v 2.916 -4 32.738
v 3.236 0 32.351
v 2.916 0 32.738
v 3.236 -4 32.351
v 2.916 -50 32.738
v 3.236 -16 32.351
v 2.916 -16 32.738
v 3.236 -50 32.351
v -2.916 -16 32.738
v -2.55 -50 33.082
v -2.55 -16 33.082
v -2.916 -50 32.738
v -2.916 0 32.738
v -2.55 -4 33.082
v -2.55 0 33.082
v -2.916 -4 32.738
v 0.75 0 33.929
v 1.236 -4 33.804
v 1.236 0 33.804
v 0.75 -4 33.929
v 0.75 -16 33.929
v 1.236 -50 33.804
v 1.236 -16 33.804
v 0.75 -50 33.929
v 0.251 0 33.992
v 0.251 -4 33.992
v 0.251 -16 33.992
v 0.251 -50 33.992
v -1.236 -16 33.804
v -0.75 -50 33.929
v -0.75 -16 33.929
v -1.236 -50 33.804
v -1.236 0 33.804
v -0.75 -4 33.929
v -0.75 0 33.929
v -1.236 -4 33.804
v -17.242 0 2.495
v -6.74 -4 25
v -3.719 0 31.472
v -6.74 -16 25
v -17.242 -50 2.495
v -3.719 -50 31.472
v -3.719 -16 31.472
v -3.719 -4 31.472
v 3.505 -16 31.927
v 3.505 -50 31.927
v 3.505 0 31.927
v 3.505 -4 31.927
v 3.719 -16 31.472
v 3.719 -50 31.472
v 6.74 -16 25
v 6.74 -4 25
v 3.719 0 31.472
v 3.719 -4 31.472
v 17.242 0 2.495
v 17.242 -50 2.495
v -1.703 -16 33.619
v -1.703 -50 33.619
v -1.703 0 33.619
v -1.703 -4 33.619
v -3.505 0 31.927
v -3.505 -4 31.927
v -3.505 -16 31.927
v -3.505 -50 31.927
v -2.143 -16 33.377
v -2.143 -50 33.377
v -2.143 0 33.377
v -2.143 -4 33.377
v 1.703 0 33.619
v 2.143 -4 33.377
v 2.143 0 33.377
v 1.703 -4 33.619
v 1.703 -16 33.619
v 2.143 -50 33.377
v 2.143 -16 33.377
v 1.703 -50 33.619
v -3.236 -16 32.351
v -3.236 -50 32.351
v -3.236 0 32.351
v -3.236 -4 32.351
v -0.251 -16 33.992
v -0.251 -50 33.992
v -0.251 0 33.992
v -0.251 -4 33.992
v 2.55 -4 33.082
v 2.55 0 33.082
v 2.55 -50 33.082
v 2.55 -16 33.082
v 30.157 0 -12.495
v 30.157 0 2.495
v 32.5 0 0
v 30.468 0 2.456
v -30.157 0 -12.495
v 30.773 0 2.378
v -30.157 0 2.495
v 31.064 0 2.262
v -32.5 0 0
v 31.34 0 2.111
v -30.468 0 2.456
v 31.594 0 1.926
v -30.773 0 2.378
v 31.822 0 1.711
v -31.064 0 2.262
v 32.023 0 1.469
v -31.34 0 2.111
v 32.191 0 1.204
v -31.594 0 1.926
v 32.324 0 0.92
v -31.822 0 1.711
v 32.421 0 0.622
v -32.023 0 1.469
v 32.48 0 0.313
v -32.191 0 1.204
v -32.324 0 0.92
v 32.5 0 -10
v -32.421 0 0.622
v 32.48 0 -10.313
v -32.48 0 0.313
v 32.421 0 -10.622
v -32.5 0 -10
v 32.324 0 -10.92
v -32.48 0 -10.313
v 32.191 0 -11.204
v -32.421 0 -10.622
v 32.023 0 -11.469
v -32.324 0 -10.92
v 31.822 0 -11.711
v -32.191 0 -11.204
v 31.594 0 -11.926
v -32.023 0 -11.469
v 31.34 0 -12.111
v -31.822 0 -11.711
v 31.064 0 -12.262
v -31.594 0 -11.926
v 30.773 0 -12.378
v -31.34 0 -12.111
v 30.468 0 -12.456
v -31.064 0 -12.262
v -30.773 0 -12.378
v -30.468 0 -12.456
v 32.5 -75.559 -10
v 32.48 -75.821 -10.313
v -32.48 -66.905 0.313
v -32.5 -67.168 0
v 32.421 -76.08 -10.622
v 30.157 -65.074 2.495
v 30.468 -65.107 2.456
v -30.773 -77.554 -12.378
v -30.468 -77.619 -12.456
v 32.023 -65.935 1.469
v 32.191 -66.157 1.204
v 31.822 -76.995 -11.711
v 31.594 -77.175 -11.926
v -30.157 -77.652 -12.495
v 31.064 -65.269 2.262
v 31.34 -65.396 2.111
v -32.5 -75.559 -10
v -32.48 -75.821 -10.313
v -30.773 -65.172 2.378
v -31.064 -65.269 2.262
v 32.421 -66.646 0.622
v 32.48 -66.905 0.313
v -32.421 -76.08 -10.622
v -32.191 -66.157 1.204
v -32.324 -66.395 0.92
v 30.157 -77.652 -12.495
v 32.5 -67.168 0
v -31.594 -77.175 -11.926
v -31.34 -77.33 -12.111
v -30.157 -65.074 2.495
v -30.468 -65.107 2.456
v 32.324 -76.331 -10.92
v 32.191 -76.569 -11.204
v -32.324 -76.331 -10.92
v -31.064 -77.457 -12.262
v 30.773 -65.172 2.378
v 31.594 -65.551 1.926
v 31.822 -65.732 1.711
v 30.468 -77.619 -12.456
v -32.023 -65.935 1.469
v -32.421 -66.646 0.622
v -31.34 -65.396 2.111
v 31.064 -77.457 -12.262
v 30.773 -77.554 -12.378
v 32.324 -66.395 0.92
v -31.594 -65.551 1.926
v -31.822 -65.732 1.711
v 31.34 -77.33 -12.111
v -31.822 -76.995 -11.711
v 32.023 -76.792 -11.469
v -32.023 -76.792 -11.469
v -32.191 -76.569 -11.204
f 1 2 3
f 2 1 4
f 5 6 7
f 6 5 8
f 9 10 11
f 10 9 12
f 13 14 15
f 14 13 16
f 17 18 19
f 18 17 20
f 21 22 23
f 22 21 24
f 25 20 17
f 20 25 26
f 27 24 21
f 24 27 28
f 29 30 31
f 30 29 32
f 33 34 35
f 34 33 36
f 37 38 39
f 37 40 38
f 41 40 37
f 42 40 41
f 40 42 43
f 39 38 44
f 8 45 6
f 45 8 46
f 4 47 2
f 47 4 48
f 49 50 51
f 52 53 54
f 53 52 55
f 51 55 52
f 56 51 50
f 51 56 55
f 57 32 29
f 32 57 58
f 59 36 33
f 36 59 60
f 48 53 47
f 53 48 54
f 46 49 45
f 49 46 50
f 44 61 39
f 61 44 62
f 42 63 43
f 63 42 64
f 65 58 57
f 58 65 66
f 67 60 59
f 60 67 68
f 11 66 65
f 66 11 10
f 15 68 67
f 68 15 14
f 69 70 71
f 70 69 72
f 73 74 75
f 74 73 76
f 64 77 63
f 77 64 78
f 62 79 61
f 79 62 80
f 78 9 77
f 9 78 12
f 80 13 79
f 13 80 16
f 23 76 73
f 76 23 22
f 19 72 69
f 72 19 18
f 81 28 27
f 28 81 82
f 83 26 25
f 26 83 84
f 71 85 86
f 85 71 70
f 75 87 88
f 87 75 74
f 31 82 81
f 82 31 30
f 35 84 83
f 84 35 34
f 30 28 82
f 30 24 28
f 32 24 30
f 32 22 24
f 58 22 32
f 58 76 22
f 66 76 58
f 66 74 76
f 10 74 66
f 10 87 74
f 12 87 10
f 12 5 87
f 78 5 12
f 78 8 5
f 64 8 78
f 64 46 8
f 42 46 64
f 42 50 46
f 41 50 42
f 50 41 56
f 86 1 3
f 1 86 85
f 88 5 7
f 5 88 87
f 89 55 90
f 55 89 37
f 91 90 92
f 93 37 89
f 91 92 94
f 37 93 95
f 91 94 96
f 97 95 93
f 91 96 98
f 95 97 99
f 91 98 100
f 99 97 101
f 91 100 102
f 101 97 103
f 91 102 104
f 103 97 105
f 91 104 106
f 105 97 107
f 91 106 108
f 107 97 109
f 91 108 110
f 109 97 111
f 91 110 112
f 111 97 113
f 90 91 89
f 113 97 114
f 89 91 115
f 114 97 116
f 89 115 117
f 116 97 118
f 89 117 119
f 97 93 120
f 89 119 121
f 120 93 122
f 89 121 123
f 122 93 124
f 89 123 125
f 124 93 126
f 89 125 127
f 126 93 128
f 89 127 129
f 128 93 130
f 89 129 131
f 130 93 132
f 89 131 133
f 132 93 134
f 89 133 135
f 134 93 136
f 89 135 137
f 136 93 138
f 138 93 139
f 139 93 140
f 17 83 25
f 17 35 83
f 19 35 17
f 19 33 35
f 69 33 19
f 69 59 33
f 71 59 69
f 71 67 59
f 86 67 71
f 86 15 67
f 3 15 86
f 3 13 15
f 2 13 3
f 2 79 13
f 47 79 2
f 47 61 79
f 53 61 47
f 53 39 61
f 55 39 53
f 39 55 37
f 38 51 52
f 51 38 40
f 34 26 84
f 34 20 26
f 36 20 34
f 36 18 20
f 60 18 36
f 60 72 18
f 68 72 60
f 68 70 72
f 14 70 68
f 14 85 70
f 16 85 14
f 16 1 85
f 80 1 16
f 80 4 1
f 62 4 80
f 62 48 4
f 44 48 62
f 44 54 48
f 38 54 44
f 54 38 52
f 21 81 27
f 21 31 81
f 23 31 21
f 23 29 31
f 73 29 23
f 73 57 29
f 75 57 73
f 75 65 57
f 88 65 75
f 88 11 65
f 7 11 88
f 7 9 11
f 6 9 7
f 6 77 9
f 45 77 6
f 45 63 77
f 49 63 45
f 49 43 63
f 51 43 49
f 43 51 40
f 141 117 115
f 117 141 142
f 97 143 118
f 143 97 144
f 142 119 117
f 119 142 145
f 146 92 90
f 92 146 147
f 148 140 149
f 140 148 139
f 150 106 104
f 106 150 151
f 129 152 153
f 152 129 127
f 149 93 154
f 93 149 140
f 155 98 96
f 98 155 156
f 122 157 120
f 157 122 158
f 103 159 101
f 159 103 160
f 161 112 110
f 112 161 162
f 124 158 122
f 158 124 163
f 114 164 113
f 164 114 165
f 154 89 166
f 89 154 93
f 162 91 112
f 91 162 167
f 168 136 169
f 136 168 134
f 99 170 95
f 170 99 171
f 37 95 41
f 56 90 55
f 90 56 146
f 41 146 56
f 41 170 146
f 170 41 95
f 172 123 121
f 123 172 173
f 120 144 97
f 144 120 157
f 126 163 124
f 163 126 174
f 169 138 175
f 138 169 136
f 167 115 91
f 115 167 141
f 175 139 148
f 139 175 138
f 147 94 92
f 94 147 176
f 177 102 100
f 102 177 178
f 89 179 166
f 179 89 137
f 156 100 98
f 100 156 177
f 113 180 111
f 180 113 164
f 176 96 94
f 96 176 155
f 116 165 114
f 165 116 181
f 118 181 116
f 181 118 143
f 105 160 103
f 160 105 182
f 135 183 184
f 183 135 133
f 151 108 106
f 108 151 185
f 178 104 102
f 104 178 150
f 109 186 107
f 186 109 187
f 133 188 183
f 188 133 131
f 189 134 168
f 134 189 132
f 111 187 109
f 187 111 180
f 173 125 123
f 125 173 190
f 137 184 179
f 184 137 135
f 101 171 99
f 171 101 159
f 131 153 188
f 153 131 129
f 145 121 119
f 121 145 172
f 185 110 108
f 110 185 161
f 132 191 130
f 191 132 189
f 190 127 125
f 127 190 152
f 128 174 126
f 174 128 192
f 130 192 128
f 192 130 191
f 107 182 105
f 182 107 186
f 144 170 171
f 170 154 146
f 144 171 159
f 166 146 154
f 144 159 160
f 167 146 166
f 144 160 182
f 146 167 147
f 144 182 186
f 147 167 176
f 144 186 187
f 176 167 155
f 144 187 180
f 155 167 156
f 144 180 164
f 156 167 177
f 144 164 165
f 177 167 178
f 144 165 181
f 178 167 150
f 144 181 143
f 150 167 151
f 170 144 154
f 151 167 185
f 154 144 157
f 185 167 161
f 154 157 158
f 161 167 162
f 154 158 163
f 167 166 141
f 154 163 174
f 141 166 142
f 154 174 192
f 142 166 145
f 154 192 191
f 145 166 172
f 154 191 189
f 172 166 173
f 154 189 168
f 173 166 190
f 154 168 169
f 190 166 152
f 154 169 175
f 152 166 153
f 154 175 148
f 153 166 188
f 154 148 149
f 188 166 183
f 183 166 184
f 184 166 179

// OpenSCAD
/*
 * birthday_glasses_holder.scad
 * An eye glasses holder design for Parul on her
 * birthday: May 29th, 2017
 */
corner_dia = 8;
glasses_base_width = 28;
glasses_base_height = 30;
glasses_base_length = 50;
cutout_length = 12;
base_width = 60;
base_length = 80;

$fn=50;
module triangularBase(width, height, length, corner_diameter) {
    linear_extrude(height=length)
    hull() {
        translate([-width/2,0,0])circle(d=corner_diameter);
        translate([width/2,0,0])circle(d=corner_diameter);
        translate([0,height,0])circle(d=corner_diameter);
    }
}

module rounded_cube(x, y, z, d) {
    translate([0,-y/4,0])
    linear_extrude(z)
    hull(){
        translate([-x/2,0,0])circle(d=d);
        translate([x/2,0,0])circle(d=d);
        translate([-x/2,y/2,0])circle(d=d);
        translate([x/2,y/2,0])circle(d=d);
    }
}

module glassesHolder(){
    difference() {
        rotate([90,0,0])triangularBase(glasses_base_width, glasses_base_height, glasses_base_length, corner_dia);
        translate([0,-10,glasses_base_height])cube([15,cutout_length,10], center=true);
    }
}

union() {
    glassesHolder();
    difference() {
        translate([0,0,-5])rotate([90,0,0])rounded_cube(base_width, 20, base_length, 5);
        translate([0,-base_length+5,0])rotate([-40,0,0])cube([base_width+40,12,30], center=true);
    }
}
